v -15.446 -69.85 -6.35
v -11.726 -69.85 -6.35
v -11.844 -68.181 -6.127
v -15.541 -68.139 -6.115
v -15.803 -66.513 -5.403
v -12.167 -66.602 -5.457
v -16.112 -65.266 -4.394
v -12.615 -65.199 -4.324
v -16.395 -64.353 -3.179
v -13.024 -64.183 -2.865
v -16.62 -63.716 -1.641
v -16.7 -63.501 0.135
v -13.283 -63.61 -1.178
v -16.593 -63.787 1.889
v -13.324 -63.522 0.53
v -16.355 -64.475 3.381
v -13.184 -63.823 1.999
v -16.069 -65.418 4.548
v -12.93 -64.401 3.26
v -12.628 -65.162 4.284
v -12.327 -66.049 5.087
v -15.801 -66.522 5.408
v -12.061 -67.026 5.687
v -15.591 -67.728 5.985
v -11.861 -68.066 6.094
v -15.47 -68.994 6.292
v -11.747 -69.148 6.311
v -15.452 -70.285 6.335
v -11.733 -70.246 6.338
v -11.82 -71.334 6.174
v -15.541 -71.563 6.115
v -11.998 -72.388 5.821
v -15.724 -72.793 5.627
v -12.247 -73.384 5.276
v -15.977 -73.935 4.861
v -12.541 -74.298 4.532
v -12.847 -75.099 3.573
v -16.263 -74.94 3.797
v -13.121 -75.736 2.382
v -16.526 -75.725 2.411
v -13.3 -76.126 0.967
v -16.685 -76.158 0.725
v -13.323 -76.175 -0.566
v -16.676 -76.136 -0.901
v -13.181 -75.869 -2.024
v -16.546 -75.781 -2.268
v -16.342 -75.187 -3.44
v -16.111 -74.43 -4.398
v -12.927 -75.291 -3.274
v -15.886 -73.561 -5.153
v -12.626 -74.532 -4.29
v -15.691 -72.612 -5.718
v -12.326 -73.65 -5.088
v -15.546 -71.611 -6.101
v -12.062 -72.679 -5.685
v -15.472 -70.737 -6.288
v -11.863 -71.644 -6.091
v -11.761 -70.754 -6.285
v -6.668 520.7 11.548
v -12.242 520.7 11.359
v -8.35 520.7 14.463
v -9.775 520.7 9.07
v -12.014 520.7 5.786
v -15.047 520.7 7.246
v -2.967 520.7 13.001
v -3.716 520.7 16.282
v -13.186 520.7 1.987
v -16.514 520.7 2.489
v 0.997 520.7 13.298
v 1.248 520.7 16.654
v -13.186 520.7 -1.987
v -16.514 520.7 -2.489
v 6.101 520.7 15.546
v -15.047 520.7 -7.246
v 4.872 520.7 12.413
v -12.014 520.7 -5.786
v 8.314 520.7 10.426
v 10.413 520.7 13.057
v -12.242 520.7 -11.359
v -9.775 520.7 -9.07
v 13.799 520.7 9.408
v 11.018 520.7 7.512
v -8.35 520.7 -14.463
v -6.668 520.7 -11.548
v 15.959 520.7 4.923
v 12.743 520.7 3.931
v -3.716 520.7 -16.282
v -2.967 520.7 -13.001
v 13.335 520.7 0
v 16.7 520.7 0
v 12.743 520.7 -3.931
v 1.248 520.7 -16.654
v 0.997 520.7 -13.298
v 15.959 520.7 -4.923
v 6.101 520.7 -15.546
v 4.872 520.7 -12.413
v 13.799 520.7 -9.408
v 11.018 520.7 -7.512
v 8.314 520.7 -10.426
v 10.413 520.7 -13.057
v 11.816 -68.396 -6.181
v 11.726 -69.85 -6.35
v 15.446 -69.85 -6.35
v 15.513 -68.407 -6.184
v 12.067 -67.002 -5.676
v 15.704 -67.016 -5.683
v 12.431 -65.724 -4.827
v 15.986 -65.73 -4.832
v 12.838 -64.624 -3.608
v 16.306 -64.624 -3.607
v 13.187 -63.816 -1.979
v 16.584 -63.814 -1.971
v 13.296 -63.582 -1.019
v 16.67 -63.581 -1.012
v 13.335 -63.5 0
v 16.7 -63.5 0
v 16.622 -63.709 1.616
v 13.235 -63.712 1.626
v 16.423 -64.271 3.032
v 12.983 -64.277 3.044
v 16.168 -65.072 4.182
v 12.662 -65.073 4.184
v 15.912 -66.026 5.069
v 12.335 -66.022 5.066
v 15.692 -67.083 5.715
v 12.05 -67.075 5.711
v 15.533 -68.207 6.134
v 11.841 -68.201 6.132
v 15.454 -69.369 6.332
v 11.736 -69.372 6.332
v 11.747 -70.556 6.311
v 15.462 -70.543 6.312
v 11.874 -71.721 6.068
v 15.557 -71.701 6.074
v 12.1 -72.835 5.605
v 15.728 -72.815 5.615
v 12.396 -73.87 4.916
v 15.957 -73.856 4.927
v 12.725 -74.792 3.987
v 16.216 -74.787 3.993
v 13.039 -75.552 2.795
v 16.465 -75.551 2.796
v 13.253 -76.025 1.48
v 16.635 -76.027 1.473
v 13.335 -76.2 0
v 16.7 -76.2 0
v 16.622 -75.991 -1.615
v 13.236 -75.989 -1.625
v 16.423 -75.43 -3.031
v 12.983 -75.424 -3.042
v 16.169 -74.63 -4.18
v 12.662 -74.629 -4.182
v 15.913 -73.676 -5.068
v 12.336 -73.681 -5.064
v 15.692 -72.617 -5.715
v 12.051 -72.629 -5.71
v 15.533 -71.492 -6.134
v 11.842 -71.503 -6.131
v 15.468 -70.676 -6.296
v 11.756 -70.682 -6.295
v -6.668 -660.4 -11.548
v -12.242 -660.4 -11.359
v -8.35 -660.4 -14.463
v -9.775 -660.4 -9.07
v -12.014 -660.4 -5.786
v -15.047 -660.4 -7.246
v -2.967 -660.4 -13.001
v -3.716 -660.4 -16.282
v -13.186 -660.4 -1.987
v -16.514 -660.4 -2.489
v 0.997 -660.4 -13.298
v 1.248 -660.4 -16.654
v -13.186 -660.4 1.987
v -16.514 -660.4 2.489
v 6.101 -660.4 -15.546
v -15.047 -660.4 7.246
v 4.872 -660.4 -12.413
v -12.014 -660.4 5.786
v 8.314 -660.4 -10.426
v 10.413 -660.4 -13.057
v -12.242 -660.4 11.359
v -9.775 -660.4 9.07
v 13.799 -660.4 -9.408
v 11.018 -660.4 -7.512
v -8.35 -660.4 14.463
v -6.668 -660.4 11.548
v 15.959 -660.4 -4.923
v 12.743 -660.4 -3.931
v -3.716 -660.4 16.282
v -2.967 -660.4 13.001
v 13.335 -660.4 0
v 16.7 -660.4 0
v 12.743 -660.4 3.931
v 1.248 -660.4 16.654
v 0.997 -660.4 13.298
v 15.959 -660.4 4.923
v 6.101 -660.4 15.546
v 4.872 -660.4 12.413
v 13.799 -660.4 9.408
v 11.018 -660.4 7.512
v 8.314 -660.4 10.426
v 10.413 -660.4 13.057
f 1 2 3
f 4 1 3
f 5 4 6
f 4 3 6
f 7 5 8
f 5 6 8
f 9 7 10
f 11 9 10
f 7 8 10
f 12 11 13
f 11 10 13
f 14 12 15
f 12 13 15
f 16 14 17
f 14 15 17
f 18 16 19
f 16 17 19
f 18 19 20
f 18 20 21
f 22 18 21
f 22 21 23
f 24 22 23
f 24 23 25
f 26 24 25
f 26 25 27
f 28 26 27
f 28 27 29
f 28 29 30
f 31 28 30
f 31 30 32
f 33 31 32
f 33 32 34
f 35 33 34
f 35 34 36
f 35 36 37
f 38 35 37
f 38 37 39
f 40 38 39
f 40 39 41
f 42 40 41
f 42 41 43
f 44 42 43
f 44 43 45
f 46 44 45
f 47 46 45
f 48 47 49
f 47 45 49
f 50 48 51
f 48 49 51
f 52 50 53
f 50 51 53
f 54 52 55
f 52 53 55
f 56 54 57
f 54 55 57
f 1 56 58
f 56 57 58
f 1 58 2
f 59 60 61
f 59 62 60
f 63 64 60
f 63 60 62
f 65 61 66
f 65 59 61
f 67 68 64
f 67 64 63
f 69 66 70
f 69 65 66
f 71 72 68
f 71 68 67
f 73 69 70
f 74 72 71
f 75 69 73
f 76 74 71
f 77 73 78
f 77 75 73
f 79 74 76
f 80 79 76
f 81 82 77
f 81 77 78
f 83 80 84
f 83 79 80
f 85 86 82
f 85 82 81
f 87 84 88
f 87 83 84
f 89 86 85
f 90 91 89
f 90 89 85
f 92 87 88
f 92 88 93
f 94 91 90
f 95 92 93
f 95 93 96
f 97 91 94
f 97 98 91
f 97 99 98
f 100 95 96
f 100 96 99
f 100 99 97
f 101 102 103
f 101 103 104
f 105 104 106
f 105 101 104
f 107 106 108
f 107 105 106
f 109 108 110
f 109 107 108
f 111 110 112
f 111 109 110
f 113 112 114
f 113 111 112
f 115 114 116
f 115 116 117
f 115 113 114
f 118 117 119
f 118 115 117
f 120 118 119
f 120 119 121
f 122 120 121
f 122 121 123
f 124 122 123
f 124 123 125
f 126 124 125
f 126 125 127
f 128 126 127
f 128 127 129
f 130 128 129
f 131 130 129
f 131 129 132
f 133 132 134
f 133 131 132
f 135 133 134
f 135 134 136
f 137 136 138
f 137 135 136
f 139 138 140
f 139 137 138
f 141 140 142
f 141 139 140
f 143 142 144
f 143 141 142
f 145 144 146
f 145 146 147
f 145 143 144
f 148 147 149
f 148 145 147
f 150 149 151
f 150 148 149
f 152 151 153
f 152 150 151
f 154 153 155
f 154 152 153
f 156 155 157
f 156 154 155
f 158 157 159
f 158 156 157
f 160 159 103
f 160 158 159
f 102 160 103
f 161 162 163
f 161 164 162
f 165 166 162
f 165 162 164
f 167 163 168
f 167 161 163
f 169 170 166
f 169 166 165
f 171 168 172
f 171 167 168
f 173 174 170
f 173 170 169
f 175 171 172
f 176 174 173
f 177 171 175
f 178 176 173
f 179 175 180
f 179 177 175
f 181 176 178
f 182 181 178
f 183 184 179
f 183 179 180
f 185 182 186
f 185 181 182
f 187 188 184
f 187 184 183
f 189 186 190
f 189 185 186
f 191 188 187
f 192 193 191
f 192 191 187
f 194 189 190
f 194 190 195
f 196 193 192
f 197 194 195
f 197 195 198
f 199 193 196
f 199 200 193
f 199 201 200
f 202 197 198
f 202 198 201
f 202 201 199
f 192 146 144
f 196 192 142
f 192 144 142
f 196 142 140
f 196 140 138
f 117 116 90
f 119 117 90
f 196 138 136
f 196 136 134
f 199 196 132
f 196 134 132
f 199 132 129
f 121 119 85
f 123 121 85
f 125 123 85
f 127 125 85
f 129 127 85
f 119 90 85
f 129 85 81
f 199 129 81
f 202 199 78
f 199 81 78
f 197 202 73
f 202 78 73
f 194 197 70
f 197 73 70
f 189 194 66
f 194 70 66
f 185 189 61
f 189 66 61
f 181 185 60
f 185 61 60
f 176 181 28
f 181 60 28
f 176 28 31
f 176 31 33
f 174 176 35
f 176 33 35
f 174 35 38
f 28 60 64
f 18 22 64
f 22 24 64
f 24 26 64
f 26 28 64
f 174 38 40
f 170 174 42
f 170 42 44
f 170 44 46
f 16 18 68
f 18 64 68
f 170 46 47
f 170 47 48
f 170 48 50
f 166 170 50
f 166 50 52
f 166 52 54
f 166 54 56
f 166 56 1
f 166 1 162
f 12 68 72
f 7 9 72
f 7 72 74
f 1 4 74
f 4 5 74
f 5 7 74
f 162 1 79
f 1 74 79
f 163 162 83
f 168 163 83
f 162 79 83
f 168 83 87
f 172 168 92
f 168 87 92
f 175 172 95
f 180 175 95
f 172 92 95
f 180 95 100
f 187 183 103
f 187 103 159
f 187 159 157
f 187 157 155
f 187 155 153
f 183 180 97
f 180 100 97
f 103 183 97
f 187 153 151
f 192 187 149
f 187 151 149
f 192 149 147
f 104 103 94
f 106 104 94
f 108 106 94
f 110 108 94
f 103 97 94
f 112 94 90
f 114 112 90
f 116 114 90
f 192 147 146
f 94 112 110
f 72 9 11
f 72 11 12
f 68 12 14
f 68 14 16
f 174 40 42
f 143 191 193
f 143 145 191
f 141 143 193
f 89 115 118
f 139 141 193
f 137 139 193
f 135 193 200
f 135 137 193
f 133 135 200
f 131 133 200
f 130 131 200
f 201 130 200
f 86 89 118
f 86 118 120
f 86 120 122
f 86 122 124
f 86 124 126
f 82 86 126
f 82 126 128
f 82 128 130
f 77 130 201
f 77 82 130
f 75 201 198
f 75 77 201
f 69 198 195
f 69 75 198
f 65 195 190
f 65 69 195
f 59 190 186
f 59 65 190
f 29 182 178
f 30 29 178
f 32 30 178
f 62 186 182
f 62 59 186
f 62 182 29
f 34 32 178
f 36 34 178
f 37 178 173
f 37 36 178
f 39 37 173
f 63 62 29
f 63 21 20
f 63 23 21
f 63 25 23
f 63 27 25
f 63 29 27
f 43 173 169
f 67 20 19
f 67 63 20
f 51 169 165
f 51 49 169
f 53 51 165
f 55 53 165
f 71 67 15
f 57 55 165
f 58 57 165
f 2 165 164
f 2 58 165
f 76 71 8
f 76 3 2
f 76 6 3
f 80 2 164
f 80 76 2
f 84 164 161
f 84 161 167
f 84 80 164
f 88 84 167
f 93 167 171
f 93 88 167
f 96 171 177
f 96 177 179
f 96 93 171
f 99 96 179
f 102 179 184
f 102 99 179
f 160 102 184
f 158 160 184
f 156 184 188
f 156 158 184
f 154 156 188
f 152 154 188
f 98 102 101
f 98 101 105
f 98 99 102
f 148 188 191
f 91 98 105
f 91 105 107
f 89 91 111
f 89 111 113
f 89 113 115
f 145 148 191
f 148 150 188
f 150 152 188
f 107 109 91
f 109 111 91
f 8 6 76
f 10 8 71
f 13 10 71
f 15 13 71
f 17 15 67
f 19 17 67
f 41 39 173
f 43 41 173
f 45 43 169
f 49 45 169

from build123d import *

# Parameters (mm, degrees)
SKETCH1_R               = 16.7005
SKETCH1_R_2             = 13.335
BOSS_EXTRUDE1_DEPTH     = 520.7
SKETCH3_R               = 16.7005
SKETCH3_R_2             = 13.335
BOSS_EXTRUDE2_DEPTH     = 660.4
SKETCH2_R               = 6.35
CUT_EXTRUDE1_DEPTH      = 17.7005
CUT_EXTRUDE1_DEPTH_BACK = 17.7005


with BuildPart() as part:
    # Sketch1 → Boss-Extrude1 (new body)
    with BuildSketch(Plane(origin=(0, 0, 0), x_dir=(1, 0, 0), z_dir=(0, 1, 0))):
        Circle(SKETCH1_R)
        Circle(SKETCH1_R_2, mode=Mode.SUBTRACT)
    extrude(amount=BOSS_EXTRUDE1_DEPTH)

    # Sketch3 → Boss-Extrude2 (add)
    with BuildSketch(Plane.XZ):
        Circle(SKETCH3_R)
        Circle(SKETCH3_R_2, mode=Mode.SUBTRACT)
    extrude(amount=BOSS_EXTRUDE2_DEPTH)

    # Sketch2 → Cut-Extrude1 (cut, two sides)
    with BuildSketch(Plane(origin=(0, 0, 0), x_dir=(0, 0, -1), z_dir=(1, 0, 0))) as cut_extrude1_sk:
        with Locations((0, -69.85)):
            Circle(SKETCH2_R)
    extrude(amount=CUT_EXTRUDE1_DEPTH, mode=Mode.SUBTRACT)
    extrude(cut_extrude1_sk.sketch, amount=-CUT_EXTRUDE1_DEPTH_BACK, mode=Mode.SUBTRACT)


solid = part.part
